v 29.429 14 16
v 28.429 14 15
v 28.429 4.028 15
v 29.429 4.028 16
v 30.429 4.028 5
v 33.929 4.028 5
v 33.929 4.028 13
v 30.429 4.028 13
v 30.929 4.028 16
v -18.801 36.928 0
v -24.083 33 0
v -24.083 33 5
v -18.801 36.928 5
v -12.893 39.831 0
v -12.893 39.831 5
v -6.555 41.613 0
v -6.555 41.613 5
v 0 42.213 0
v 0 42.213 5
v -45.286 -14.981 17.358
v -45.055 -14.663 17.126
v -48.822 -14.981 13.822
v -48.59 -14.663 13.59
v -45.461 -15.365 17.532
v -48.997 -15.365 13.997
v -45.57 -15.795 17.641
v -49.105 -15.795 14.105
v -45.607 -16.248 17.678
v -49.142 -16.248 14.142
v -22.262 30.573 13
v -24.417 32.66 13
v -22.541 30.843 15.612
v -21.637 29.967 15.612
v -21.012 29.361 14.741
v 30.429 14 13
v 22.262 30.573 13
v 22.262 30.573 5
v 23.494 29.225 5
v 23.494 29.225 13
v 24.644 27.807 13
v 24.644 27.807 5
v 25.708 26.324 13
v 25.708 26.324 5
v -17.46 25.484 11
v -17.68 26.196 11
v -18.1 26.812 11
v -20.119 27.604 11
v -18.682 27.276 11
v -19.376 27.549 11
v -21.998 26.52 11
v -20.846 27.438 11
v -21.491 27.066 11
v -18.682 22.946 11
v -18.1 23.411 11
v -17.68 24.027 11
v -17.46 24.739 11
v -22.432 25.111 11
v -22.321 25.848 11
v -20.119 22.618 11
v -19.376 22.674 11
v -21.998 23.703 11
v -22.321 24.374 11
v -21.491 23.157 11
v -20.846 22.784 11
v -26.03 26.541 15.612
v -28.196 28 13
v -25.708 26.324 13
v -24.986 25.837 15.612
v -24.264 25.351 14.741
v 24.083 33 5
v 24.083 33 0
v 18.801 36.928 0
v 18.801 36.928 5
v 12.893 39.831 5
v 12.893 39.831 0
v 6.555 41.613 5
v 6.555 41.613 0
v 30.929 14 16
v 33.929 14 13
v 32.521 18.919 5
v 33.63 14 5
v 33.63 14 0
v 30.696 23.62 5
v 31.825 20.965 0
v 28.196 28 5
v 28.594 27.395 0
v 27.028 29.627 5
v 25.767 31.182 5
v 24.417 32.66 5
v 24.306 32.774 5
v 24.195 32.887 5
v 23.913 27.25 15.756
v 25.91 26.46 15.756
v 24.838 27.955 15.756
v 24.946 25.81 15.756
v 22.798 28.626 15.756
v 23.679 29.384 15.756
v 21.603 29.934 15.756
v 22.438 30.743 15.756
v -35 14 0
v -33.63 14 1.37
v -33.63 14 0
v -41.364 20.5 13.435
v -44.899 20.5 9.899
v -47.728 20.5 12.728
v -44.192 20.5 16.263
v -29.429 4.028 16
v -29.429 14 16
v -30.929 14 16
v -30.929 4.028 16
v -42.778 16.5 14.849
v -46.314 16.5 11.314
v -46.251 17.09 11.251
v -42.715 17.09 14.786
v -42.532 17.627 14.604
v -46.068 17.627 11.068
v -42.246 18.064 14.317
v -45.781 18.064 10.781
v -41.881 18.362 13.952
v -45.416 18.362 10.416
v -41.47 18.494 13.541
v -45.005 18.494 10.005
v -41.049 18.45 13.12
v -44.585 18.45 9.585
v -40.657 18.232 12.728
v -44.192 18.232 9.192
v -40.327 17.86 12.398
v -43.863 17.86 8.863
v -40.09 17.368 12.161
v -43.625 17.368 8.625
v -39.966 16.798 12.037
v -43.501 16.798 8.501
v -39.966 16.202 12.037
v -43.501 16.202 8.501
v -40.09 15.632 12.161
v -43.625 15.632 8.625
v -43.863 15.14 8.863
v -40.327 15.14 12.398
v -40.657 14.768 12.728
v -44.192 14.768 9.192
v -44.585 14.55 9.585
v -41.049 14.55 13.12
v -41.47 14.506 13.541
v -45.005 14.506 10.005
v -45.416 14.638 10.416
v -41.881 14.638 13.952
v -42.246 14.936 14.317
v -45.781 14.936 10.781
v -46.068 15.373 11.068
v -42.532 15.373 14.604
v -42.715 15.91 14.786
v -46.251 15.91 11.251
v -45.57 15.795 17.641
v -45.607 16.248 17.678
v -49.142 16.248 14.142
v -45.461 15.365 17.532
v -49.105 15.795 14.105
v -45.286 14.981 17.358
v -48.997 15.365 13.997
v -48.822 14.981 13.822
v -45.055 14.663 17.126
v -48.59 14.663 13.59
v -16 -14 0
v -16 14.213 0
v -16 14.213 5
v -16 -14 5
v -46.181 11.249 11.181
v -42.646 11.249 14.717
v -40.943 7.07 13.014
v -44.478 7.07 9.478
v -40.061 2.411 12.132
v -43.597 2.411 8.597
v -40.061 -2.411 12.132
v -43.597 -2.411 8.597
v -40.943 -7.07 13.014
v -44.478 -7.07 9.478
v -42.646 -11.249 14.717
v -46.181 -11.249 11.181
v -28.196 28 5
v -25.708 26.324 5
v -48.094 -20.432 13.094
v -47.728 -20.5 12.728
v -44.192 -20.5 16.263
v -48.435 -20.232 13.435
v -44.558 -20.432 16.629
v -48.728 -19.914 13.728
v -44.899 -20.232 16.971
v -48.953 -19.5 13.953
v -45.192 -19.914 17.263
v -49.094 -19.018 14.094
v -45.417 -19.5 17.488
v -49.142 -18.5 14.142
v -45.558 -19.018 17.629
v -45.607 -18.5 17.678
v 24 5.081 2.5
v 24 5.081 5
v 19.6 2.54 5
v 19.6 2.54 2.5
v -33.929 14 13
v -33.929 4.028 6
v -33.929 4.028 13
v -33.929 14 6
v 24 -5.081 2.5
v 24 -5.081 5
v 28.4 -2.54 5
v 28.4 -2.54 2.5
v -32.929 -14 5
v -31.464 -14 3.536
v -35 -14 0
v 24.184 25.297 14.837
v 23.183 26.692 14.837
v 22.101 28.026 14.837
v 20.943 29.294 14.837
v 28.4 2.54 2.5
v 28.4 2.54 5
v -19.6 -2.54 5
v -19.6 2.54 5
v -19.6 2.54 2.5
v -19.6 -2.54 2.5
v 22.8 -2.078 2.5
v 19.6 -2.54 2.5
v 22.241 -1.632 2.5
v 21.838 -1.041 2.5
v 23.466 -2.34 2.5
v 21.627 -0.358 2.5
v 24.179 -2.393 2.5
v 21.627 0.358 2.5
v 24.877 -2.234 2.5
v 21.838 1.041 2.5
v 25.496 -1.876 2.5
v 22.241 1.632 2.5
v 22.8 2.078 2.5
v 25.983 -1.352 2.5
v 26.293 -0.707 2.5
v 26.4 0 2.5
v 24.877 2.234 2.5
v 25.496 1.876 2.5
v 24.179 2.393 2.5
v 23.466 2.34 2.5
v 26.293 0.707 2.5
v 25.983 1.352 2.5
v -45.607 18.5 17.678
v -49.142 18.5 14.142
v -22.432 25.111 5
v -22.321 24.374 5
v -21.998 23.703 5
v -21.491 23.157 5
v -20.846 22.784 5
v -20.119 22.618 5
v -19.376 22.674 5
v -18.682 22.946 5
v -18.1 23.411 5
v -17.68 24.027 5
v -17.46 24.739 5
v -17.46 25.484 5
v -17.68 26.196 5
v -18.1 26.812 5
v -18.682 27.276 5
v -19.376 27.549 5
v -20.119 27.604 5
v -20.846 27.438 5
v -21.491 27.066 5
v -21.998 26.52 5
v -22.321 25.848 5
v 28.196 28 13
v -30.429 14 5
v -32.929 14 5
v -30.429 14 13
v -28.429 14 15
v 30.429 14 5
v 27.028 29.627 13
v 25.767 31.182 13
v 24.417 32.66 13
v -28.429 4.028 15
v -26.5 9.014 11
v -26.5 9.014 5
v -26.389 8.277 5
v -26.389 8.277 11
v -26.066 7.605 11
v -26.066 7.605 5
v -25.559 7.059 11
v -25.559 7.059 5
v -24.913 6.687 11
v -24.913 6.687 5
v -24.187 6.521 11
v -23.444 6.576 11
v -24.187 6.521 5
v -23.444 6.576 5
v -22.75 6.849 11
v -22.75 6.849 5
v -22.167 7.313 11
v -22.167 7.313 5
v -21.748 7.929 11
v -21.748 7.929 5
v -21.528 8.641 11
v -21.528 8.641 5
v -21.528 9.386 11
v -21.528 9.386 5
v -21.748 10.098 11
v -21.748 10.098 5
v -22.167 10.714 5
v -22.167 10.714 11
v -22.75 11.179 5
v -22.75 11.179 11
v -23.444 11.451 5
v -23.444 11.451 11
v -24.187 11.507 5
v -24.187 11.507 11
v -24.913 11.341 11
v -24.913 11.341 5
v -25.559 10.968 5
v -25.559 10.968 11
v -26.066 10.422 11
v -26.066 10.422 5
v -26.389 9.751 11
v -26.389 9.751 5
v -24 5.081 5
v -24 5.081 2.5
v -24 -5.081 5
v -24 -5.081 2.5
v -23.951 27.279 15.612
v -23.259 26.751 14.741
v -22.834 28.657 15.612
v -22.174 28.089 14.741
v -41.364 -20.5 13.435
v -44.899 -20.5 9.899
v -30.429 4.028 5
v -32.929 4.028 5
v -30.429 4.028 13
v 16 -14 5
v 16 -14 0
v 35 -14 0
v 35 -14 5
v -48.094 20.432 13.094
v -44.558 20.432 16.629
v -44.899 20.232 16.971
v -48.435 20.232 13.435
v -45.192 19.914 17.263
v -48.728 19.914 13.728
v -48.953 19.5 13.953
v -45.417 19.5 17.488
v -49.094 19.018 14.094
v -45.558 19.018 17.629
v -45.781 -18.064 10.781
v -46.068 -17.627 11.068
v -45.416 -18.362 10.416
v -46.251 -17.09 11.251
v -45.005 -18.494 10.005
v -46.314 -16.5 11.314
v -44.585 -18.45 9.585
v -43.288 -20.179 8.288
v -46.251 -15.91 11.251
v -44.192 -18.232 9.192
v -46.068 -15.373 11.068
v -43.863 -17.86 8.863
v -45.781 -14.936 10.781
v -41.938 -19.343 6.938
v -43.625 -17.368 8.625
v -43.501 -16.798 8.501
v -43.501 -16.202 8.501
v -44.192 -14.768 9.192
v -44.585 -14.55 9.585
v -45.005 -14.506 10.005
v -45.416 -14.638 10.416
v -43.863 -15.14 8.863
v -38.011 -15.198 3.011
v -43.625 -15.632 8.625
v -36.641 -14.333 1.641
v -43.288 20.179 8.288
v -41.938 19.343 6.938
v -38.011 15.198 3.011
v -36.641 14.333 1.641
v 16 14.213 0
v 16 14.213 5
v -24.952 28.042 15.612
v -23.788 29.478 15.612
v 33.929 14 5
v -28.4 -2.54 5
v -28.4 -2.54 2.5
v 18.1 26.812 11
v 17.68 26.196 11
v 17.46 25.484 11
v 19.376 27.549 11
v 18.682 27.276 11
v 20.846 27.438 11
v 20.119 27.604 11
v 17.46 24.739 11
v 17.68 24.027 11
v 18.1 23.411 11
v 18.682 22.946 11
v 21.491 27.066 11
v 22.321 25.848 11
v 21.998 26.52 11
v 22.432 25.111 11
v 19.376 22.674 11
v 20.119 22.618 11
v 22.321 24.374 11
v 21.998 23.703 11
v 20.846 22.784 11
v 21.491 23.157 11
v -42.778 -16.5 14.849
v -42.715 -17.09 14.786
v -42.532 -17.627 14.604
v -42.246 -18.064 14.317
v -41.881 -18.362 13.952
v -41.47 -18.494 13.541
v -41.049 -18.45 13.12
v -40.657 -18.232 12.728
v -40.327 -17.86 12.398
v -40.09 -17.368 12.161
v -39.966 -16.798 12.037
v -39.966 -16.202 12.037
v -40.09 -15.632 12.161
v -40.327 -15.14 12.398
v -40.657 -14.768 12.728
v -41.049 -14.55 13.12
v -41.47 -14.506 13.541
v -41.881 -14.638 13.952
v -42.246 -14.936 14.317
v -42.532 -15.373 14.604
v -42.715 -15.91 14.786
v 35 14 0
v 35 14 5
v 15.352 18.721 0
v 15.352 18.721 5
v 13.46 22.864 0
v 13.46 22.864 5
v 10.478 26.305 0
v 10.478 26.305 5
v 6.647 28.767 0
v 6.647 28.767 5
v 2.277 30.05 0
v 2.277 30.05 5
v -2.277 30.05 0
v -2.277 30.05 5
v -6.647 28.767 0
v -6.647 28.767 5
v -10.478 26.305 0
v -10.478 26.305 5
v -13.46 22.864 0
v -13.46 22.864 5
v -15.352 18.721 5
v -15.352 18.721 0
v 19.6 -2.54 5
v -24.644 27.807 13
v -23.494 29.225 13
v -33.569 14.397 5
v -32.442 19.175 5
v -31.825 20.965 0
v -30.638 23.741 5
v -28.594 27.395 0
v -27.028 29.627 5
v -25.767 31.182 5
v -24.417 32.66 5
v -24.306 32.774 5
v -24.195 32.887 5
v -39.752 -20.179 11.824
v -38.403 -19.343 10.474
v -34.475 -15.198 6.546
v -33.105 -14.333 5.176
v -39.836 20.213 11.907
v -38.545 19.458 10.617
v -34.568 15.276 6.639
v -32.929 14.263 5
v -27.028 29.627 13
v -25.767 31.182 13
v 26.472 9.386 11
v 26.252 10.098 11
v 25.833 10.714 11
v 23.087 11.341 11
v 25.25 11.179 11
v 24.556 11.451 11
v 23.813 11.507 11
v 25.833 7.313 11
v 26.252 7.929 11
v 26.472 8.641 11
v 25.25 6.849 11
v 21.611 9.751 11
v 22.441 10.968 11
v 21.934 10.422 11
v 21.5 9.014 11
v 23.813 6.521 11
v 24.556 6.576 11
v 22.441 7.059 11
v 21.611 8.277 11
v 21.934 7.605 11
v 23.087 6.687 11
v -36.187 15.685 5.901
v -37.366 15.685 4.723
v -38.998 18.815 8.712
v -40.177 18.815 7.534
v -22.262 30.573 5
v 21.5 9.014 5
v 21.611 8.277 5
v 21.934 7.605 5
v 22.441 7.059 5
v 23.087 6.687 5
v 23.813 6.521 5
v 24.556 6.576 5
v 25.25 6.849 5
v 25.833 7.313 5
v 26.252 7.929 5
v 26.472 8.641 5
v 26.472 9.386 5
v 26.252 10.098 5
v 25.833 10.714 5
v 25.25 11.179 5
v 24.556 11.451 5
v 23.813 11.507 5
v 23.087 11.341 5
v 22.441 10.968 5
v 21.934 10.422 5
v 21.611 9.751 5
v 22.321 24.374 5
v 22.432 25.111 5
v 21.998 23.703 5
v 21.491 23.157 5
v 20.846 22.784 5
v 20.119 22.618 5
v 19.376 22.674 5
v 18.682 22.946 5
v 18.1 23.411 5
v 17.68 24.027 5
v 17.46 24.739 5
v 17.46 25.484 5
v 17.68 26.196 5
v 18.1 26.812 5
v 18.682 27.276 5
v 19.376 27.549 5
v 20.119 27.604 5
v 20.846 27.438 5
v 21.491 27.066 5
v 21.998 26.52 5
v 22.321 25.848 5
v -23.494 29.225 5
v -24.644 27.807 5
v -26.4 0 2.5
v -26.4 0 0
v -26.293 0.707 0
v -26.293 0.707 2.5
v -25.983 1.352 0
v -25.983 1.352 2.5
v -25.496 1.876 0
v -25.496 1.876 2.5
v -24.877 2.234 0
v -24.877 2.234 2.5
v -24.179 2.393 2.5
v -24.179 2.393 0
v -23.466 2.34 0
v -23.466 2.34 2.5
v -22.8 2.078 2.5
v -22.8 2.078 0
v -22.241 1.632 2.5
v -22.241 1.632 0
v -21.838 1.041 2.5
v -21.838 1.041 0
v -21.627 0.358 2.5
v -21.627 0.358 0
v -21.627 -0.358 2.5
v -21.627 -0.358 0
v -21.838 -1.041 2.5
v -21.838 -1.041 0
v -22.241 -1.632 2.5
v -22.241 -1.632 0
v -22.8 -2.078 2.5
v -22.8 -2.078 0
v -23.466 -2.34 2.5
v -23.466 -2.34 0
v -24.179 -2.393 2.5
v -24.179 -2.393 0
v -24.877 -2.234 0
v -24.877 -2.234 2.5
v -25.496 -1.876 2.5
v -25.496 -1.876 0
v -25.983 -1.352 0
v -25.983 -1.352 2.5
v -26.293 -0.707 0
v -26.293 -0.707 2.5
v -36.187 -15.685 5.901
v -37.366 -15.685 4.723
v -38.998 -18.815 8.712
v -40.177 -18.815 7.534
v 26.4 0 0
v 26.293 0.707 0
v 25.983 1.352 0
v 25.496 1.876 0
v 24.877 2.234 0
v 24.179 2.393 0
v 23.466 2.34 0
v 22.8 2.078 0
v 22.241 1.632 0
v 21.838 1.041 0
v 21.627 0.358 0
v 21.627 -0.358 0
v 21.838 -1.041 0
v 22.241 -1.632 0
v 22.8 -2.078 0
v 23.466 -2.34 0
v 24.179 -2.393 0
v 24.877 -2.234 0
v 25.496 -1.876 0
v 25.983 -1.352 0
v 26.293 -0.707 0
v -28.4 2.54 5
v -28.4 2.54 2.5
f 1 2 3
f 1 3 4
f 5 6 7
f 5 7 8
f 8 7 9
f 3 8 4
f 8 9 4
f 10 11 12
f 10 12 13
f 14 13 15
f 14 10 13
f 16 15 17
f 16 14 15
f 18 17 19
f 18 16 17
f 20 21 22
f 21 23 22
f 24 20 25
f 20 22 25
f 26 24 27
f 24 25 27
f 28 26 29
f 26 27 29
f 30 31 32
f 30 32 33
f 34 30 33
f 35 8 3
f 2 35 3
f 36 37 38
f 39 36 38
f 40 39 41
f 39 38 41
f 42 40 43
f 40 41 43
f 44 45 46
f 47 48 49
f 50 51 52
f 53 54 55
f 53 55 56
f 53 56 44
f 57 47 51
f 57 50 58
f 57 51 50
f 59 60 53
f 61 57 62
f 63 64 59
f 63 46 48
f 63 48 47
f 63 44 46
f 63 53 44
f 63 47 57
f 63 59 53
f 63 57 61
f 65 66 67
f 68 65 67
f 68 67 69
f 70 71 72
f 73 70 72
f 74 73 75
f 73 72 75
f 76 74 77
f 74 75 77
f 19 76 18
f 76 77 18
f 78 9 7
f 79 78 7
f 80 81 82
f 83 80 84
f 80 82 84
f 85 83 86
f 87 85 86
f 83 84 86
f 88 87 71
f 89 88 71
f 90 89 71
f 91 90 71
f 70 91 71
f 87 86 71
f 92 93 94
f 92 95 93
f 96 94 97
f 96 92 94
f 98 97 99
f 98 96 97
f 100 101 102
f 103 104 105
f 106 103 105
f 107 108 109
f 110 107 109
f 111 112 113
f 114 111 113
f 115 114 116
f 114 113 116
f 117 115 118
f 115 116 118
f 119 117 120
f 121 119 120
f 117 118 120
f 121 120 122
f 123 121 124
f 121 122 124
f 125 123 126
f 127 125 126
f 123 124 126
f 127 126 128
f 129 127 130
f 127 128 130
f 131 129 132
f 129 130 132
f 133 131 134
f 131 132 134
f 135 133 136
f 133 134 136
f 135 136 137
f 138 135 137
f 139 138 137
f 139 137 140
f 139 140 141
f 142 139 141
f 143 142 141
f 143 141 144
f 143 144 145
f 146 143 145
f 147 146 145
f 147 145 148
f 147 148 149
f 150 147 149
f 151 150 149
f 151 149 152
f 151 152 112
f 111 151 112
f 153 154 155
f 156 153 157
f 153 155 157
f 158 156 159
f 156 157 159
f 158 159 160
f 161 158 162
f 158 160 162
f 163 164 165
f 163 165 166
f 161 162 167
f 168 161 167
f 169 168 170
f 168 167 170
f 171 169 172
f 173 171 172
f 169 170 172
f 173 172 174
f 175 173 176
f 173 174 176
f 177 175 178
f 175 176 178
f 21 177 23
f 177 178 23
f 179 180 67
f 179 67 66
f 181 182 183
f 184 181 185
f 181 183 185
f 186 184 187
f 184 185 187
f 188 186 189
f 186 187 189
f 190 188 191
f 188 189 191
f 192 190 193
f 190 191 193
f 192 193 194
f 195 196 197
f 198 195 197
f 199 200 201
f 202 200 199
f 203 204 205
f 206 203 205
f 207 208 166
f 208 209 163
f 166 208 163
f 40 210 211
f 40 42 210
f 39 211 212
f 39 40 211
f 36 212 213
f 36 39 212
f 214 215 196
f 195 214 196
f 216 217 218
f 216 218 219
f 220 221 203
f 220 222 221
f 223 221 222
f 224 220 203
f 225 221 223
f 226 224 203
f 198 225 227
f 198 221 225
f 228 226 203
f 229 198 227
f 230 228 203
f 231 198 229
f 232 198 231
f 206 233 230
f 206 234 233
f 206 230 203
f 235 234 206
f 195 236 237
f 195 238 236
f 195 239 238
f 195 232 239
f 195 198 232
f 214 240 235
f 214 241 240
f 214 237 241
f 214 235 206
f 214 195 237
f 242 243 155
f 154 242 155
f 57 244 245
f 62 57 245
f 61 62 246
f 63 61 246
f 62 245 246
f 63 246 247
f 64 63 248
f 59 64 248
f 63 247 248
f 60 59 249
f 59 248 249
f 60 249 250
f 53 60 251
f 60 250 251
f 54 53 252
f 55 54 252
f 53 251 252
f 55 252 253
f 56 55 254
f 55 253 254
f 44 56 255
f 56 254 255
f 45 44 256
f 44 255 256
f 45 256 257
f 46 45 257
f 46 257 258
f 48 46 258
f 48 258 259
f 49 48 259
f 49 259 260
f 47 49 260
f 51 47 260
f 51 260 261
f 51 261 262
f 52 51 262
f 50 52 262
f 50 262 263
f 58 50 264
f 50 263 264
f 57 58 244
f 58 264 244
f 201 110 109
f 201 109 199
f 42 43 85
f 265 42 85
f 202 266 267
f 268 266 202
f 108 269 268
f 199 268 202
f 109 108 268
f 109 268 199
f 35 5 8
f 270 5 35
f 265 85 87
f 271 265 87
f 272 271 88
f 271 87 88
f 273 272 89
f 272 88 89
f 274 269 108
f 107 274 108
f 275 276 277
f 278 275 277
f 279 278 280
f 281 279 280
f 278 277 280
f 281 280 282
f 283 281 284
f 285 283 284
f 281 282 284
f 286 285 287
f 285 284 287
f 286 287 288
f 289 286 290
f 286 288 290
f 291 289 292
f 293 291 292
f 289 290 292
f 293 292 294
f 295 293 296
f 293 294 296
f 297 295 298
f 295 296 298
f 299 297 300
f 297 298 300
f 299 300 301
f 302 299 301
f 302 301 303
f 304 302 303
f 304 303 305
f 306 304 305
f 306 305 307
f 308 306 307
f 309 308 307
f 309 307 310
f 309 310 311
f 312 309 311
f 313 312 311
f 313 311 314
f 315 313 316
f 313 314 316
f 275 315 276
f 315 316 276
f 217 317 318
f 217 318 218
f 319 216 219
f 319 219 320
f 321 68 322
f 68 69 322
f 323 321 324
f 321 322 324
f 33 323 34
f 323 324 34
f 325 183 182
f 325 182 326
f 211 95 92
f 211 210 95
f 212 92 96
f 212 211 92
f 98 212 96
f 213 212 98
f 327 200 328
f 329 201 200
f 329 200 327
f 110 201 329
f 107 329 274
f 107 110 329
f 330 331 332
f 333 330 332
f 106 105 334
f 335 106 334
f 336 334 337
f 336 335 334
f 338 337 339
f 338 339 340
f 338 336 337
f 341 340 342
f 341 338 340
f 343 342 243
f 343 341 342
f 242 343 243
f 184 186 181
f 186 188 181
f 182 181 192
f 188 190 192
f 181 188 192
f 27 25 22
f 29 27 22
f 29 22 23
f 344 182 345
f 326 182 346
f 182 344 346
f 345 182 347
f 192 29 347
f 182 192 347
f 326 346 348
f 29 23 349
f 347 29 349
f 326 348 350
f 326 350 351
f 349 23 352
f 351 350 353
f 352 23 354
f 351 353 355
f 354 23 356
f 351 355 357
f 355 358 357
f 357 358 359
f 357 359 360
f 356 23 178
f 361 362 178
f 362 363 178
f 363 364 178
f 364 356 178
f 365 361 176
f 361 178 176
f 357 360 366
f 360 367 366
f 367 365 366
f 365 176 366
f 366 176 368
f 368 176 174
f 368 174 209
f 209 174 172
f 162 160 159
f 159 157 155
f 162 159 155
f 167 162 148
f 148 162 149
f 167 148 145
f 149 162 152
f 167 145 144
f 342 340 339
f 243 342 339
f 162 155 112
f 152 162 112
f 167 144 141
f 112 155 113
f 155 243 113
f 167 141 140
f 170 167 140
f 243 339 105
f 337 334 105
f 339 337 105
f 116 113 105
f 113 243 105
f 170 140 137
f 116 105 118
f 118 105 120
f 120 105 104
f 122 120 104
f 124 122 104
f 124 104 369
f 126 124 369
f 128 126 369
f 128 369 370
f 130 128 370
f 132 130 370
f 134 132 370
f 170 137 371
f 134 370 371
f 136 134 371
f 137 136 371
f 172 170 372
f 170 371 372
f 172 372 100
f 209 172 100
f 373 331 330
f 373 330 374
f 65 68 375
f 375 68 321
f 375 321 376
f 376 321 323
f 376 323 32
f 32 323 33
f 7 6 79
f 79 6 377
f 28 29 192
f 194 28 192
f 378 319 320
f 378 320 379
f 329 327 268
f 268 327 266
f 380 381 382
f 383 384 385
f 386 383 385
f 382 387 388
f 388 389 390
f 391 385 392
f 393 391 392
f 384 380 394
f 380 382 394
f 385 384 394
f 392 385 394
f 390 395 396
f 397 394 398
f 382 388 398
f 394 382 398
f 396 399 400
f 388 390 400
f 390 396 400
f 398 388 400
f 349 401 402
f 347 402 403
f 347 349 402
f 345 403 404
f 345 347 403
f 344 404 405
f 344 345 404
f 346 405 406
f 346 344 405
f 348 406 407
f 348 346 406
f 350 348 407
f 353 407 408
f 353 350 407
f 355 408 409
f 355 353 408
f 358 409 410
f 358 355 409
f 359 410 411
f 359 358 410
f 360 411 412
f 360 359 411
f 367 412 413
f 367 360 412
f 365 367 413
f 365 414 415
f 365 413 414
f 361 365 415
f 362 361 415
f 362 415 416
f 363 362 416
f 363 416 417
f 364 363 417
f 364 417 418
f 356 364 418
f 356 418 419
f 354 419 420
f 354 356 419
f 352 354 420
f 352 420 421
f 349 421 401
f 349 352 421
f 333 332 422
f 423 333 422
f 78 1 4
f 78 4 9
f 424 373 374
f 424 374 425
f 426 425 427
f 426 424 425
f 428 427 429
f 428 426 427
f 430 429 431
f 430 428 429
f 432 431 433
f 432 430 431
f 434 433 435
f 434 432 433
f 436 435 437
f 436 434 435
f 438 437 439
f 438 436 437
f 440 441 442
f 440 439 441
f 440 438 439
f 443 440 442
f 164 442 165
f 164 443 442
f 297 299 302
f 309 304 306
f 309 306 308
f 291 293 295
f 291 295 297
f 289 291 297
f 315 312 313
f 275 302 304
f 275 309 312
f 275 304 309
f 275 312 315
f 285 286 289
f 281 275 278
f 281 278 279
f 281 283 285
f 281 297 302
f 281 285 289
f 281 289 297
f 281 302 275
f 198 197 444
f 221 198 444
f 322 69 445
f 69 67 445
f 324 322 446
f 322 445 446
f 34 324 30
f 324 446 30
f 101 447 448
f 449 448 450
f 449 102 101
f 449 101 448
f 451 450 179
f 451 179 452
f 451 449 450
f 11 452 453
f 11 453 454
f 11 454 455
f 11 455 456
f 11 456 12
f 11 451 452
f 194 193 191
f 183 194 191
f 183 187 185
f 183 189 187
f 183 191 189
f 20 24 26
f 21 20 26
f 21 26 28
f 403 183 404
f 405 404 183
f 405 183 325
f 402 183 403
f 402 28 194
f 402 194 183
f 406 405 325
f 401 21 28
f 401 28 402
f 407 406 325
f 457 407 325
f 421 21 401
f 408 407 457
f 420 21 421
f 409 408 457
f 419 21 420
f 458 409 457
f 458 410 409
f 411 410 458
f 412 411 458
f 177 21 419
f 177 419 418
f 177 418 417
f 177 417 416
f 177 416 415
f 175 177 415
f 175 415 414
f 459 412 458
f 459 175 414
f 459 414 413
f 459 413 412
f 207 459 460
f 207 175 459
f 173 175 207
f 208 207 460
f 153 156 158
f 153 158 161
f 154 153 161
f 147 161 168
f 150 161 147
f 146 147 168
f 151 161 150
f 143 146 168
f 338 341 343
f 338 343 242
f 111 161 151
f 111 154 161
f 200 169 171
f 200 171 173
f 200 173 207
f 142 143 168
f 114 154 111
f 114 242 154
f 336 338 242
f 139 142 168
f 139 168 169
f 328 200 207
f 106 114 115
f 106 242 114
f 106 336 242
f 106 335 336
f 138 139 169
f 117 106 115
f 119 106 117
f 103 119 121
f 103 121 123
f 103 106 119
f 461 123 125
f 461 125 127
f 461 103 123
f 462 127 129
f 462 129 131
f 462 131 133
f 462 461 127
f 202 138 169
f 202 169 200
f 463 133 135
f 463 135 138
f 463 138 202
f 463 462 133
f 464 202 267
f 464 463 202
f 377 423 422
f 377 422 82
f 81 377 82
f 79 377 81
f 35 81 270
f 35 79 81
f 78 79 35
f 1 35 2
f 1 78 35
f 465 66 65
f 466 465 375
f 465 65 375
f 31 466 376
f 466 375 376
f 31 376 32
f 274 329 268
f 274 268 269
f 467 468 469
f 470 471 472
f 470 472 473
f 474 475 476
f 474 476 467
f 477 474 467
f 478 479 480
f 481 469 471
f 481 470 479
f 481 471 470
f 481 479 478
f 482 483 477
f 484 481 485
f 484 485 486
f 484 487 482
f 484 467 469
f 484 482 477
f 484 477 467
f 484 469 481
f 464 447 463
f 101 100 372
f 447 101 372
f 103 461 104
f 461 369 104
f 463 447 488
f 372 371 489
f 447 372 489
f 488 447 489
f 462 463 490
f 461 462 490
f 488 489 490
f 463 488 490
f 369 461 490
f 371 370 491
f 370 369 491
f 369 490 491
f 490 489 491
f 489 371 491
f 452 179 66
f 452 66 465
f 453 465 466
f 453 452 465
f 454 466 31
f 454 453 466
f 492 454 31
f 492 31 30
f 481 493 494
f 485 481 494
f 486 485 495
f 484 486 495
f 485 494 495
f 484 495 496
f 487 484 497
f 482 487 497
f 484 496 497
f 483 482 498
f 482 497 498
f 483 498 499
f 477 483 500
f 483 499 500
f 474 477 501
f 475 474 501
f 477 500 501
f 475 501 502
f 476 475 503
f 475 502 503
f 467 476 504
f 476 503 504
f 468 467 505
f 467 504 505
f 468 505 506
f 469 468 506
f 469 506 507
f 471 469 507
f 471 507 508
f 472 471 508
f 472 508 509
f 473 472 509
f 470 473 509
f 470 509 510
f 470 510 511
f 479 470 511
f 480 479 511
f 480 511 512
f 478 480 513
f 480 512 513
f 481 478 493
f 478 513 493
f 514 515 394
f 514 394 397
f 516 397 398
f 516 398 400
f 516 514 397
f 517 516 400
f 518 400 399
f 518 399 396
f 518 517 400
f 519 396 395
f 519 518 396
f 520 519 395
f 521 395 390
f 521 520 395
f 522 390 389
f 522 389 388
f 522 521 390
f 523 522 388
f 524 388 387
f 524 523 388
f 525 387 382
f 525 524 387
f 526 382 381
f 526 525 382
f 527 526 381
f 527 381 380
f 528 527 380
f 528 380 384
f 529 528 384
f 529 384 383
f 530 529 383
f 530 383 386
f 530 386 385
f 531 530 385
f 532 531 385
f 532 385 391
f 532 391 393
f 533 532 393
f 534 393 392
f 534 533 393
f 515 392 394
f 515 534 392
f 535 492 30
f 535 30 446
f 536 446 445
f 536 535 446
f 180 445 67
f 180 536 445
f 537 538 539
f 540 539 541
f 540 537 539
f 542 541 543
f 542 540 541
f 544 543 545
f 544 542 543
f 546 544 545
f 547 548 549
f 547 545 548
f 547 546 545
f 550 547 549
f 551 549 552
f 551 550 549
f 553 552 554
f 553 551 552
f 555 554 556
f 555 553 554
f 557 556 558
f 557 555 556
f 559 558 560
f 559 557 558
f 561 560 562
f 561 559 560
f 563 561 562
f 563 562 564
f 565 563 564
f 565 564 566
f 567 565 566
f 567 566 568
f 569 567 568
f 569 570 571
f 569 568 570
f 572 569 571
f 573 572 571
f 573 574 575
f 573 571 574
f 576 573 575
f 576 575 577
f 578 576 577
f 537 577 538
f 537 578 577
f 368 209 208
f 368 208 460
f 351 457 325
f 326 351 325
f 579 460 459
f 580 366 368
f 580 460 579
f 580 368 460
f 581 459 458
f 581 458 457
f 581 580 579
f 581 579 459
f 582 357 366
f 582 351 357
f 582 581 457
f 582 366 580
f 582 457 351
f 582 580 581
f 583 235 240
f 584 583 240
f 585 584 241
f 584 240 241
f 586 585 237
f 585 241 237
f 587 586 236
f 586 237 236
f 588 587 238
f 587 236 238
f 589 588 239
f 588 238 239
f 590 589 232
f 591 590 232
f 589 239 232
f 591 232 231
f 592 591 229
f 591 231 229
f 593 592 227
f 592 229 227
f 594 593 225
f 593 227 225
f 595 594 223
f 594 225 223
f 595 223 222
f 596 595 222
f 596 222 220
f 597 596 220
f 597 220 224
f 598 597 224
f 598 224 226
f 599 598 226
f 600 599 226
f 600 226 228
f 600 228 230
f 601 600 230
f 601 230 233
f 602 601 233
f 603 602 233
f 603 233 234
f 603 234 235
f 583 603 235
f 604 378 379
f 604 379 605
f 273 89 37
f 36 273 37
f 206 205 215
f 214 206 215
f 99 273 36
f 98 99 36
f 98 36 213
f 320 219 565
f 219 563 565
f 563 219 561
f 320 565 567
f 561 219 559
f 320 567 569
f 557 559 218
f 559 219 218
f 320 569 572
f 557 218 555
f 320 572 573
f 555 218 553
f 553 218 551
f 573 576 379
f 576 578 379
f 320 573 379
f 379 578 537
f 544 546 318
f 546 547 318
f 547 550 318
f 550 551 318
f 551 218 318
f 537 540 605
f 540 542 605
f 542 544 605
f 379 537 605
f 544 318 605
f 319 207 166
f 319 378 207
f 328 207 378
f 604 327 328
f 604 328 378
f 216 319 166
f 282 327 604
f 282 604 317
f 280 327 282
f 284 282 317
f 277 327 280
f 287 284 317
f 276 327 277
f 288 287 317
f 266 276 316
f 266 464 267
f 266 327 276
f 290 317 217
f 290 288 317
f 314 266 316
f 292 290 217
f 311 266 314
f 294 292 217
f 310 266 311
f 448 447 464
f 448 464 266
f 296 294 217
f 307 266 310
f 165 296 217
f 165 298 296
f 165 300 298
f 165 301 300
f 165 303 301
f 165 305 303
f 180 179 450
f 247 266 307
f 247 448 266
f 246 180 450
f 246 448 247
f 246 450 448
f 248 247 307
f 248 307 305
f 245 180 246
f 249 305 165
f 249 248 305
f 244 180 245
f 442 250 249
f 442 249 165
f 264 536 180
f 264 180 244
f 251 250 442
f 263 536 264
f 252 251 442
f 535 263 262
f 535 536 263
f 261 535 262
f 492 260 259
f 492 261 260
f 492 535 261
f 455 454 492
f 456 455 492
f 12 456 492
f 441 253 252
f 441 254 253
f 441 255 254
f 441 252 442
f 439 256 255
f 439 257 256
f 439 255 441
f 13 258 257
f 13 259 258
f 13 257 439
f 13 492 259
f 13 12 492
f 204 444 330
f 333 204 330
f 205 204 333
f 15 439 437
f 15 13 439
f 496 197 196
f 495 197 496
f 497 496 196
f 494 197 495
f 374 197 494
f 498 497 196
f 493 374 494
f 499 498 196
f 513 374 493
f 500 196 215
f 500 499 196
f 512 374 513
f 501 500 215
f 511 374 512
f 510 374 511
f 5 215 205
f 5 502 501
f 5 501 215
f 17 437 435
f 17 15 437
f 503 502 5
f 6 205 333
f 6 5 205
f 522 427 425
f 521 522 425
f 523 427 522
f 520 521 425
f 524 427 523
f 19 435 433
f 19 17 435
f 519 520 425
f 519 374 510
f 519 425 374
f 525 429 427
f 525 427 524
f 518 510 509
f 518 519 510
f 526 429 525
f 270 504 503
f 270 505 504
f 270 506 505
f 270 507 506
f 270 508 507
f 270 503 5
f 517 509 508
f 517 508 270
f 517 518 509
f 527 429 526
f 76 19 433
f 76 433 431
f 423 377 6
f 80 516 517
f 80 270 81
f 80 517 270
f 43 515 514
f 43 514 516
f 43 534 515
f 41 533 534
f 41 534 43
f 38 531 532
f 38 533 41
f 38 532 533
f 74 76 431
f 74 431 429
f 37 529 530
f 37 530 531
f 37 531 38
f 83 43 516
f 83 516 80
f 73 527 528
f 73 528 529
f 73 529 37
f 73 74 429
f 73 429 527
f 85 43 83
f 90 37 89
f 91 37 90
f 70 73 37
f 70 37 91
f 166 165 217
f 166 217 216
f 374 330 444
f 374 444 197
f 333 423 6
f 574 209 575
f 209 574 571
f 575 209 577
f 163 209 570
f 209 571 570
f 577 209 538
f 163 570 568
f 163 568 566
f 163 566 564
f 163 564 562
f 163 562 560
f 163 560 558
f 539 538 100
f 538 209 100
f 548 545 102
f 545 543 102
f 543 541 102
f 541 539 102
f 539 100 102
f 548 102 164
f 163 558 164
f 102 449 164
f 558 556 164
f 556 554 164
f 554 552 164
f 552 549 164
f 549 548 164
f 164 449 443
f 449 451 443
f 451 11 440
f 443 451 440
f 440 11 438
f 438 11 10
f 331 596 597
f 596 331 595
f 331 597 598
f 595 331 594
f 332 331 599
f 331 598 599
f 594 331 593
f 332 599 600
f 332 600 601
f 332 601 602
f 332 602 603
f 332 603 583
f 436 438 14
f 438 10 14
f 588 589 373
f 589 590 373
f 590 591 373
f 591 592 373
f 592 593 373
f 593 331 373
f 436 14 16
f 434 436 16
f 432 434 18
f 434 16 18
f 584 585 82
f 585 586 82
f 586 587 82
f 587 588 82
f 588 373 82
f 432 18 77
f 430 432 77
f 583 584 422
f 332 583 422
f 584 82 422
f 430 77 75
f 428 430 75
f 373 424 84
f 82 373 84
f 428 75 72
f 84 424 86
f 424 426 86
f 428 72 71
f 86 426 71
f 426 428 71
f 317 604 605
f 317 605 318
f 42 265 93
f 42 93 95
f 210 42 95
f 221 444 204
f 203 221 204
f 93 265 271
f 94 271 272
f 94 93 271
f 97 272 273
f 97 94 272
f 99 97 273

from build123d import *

# Parameters (mm, degrees)
SKETCH2_W                = 70
SKETCH2_H                = 28
BOSS_EXTRUDE1_DEPTH      = 5
CUT_NUT_DEPTH            = 2.5
SKETCH4_R                = 2.4
CUT_SCREW_DEPTH          = 38.7789624
SKETCH8_R                = 11
CUT_HOT_END_DEPTH        = 39.026306684
SKETCH11_W               = 22
SKETCH11_H               = 14
CUT_EXTRUDE8_DEPTH       = 39.026306684
BOSS_FAN_DEPTH           = 5
SKETCH9_R                = 2
CUT_FAN_SCREW_DEPTH      = 67.437703487
SKETCH10_R               = 18.5
CUT_EXTRUDE7_DEPTH       = 67.437703487
FILLET2_R                = 2
SKETCH12_W               = 3.5
SKETCH12_H               = 9.97245834
BOSS_BACK_HOOK_DEPTH     = 8
BOSS_BACK_HOOK_TOP_DEPTH = 9.97245834
SKETCH17_R               = 2.5
BOSS_EXTRUDE10_DEPTH     = 6
BOSS_FRONT_SUPPORT_REACH = 58.104
BOSS_FRONT_HOOK_DEPTH    = 8
SKETCH25_R               = 2.5
BOSS_FRONT_PIN_DEPTH     = 6
BOSS_FRONT_CURVE_DEPTH   = 5
CUT_EXTRUDE9_DEPTH       = 68.152189514


with BuildPart() as part:
    # Sketch2 → Boss-Extrude1 (new body)
    with BuildSketch(Plane.XY):
        Rectangle(SKETCH2_W, SKETCH2_H)
    extrude(amount=BOSS_EXTRUDE1_DEPTH)

    # Sketch3 → Cut-Nut (cut)
    with BuildSketch(Plane.XY.offset(5)):
        Polygon((28.4, 2.540341184), (24, 5.080682369), (19.6, 2.540341184), (19.6, -2.540341184), (24, -5.080682369), (28.4, -2.540341184), align=None)
    cut_nut = extrude(amount=-CUT_NUT_DEPTH, mode=Mode.SUBTRACT)

    # Sketch4 → Cut-Screw (cut, through all)
    with BuildSketch(Plane.XY.offset(2.5)):
        with Locations((24, 0)):
            Circle(SKETCH4_R)
    cut_screw = extrude(amount=-CUT_SCREW_DEPTH, mode=Mode.SUBTRACT)

    # Mirror1: Cut-Nut, Cut-Screw across plane
    add(cut_nut.mirror(Plane(origin=(0, 0, 0), x_dir=(0, 0, 1), z_dir=(1, 0, 0))), mode=Mode.SUBTRACT)
    add(cut_screw.mirror(Plane(origin=(0, 0, 0), x_dir=(0, 0, 1), z_dir=(1, 0, 0))), mode=Mode.SUBTRACT)

    # Sketch8 → Cut-Hot End (cut, through all)
    with BuildSketch(Plane.XY.offset(5)):
        Circle(SKETCH8_R)
    extrude(amount=-CUT_HOT_END_DEPTH, mode=Mode.SUBTRACT)

    # Sketch11 → Cut-Extrude8 (cut, through all)
    with BuildSketch(Plane.XY.offset(5)):
        with Locations((0, -7)):
            Rectangle(SKETCH11_W, SKETCH11_H)
    extrude(amount=-CUT_EXTRUDE8_DEPTH, mode=Mode.SUBTRACT)

    # Sketch6 → Boss-Fan (add)
    with BuildSketch(Plane(origin=(-17.5, 0, -17.5), x_dir=(-0.7071067811865488, 0, 0.7071067811865464), z_dir=(-0.7071067811865464, 0, -0.7071067811865488))):
        with BuildLine():
            Line((38.748737342, 20.5), (44.748737342, 20.5))
            Line((44.748737342, 20.5), (44.748737342, -20.5))
            Line((44.748737342, -20.5), (38.748737342, -20.5))
            add(Edge.make_bspline(
                [(24.748737342, -14), (30.971356168, -14), (32.526118515, -20.5), (38.748737342, -20.5)],
                knots=[0, 0, 0, 0, 1, 1, 1, 1], degree=3))
            Line((24.748737342, -14), (24.748737342, 14))
            add(Edge.make_bspline(
                [(24.748737342, 14), (30.971356168, 14), (32.526118515, 20.5), (38.748737342, 20.5)],
                knots=[0, 0, 0, 0, 1, 1, 1, 1], degree=3))
        make_face()
    extrude(amount=-BOSS_FAN_DEPTH)

    # Sketch9 → Cut-Fan Screw (cut, through all)
    with BuildSketch(Plane(origin=(-17.5, 0, -17.5), x_dir=(-0.7071067811865487, 1.3344026738283447e-14, 0.7071067811865464), z_dir=(-0.7071067811865464, 1.3877787807814728e-14, -0.7071067811865487))):
        with Locations((38.748737342, 16.5)):
            Circle(SKETCH9_R)
    cut_fan_screw = extrude(amount=-CUT_FAN_SCREW_DEPTH, mode=Mode.SUBTRACT)

    # Mirror-Fan Screw: Cut-Fan Screw across plane
    add(cut_fan_screw.mirror(Plane.ZX), mode=Mode.SUBTRACT)

    # Sketch10 → Cut-Extrude7 (cut, through all)
    with BuildSketch(Plane(origin=(-17.5, 0, -17.5), x_dir=(-0.7071067811865488, 1.4278108609963275e-14, 0.7071067811865464), z_dir=(-0.7071067811865464, 1.3877787807814742e-14, -0.7071067811865488))):
        with Locations((55.248737342, 0)):
            Circle(SKETCH10_R)
    extrude(amount=-CUT_EXTRUDE7_DEPTH, mode=Mode.SUBTRACT)

    # Fillet2
    fillet2_edges = [part.edges().sort_by_distance(p)[0] for p in [
        (-47.374368671, -15.231546212, 15.909902577),
        (-47.374368671, 15.231546212, 15.909902577),
        (-47.374368671, 20.5, 15.909902577),
        (-47.374368671, -20.5, 15.909902577),
    ]]
    fillet(fillet2_edges, radius=FILLET2_R)

    # Sketch12 → Boss-Back Hook (add)
    with BuildSketch(Plane.XY.offset(5)):
        with Locations((-32.178932188, 9.01377083)):
            Rectangle(SKETCH12_W, SKETCH12_H)
    boss_back_hook = extrude(amount=BOSS_BACK_HOOK_DEPTH)

    # Sketch14 → Boss-Back Hook Top (add)
    with BuildSketch(Plane.XZ.offset(-4.02754166)):
        Polygon((-30.428932188, 13), (-28.428932188, 15), (-29.428932188, 16), (-30.928932188, 16), (-33.928932188, 13), align=None)
    boss_back_hook_top = extrude(amount=-BOSS_BACK_HOOK_TOP_DEPTH)

    # Mirror-Back Hook: Boss-Back Hook, Boss-Back Hook Top across plane
    add(boss_back_hook.mirror(Plane(origin=(0, 0, 0), x_dir=(0, 0, 1), z_dir=(1, 0, 0))))
    add(boss_back_hook_top.mirror(Plane(origin=(0, 0, 0), x_dir=(0, 0, 1), z_dir=(1, 0, 0))))

    # Sketch17 → Boss-Extrude10 (add)
    with BuildSketch(Plane.XY.offset(5)):
        with Locations(Location((-24, 9.01377083, 0), (0, 0, 180))):
            Circle(SKETCH17_R)
        with Locations(Location((24, 9.01377083, 0), (0, 0, 180))):
            Circle(SKETCH17_R)
    extrude(amount=BOSS_EXTRUDE10_DEPTH)

    # Boss-Front Support: up to this face of the body (flat: up to its plane)
    boss_front_support_end = Plane(part.part.faces().sort_by_distance((23, -13.265266046, 5))[0])
    # Sketch20 → Boss-Front Support (add, up to the picked face)
    with BuildSketch(Plane(origin=(0, 0, 0), x_dir=(-1, 0, 0), z_dir=(0, 0, -1)), mode=Mode.PRIVATE) as boss_front_support_sk1:
        with BuildLine():
            Line((24.083189158, 33), (15.583240043, 24.529411765))
            ThreePointArc((15.583240043, 24.529411765), (19.23814858, 19.67209629), (21.424285286, 14))
            Line((21.424285286, 14), (33.630343442, 14))
            ThreePointArc((33.630343442, 14), (30.380305483, 24.265550718), (24.083189158, 33))
        make_face()
    boss_front_support_tool1 = split(extrude(boss_front_support_sk1.sketch, amount=-BOSS_FRONT_SUPPORT_REACH, mode=Mode.PRIVATE), bisect_by=boss_front_support_end, keep=Keep.BOTH, mode=Mode.PRIVATE)
    boss_front_support = boss_front_support_tool1.solids().sort_by(Axis((-24.942204, 21.980876, 0), (0, 0, 1)))[0]
    add(boss_front_support)

    # Sketch21 → Boss-Front Hook (add)
    with BuildSketch(Plane.XY.offset(5)):
        with BuildLine():
            Line((-24.416846712, 32.660464844), (-22.262419061, 30.57277677))
            ThreePointArc((-22.262419061, 30.57277677), (-24.079068363, 28.524304515), (-25.707884563, 26.323529412))
            Line((-25.707884563, 26.323529412), (-28.19574436, 28))
            ThreePointArc((-28.19574436, 28), (-26.409300785, 30.413753339), (-24.416846712, 32.660464844))
        make_face()
    boss_front_hook = extrude(amount=BOSS_FRONT_HOOK_DEPTH)

    # Sweep-Front Hook Top: sweep along a curve in space
    with BuildLine() as sweep_front_hook_top_path:
        ThreePointArc((-25.707884563, 26.323529412, 13), (-24.079068363, 28.524304515, 13), (-22.262419061, 30.57277677, 13))
    # Sketch22 → Sweep-Front Hook Top (sweep)
    with BuildSketch(Plane(origin=(4.752413936, 4.394805718, 0), x_dir=(0, 0, -1), z_dir=(0.6958960248359726, 0.7181425503460238, 0))):
        Polygon((-13, 37.617647059), (-13, 40.617647059), (-15.611662163, 38.005984896), (-15.611662163, 36.747093005), (-14.741108108, 35.87653895), align=None)
    sweep(path=sweep_front_hook_top_path.line)

    # Sketch25 → Boss-Front Pin (add)
    with BuildSketch(Plane.XY.offset(5)):
        with Locations(Location((-19.93223769, 25.111248957, 0), (0, 0, 180))):
            Circle(SKETCH25_R)
    boss_front_pin = extrude(amount=BOSS_FRONT_PIN_DEPTH)

    # Sketch23 → Boss-Front Curve (add)
    with BuildSketch(Plane(origin=(0, 0, 0), x_dir=(-1, 0, 0), z_dir=(0, 0, -1))):
        with BuildLine():
            Line((0, 42.213351454), (0, 14))
            Line((0, 14), (33.630343442, 14))
            Line((33.630343442, 14), (24.083189158, 33))
            ThreePointArc((24.083189158, 33), (12.892690226, 39.831392494), (0, 42.213351454))
        make_face()
    boss_front_curve = extrude(amount=-BOSS_FRONT_CURVE_DEPTH)

    # Mirror5: Boss-Front Support, Boss-Front Hook, Boss-Front Pin, Boss-Front Curve across plane
    add(boss_front_support.mirror(Plane(origin=(0, 0, 0), x_dir=(0, 0, 1), z_dir=(1, 0, 0))))
    add(boss_front_hook.mirror(Plane(origin=(0, 0, 0), x_dir=(0, 0, 1), z_dir=(1, 0, 0))))
    add(boss_front_pin.mirror(Plane(origin=(0, 0, 0), x_dir=(0, 0, 1), z_dir=(1, 0, 0))))
    add(boss_front_curve.mirror(Plane(origin=(0, 0, 0), x_dir=(0, 0, 1), z_dir=(1, 0, 0))))

    # Sweep2: sweep along a curve in space
    with BuildLine() as sweep2_path:
        ThreePointArc((25.707884563, 26.323529412, 13), (24.079068363, 28.524304515, 13), (22.262419061, 30.57277677, 13))
    # Sketch24 → Sweep2 (sweep)
    with BuildSketch(Plane(origin=(-4.170823776, 6.189446367, 0), x_dir=(0.8292865988159824, 0.5588235294117634, 0), z_dir=(0.5588235294117634, -0.8292865988159824, 0))):
        Polygon((36.029411765, 13), (39.029411765, 13), (36.273559232, 15.755852533), (35.110794254, 15.755852533), (34.192176743, 14.837235022), align=None)
    sweep(path=sweep2_path.line)

    # Sketch26 → Cut-Extrude9 (cut, through all)
    with BuildSketch(Plane(origin=(0, 0, 0), x_dir=(-1, 0, 0), z_dir=(0, 0, -1))):
        with BuildLine():
            Line((-16, -14), (-16, 14.213351454))
            ThreePointArc((-16, 14.213351454), (0, 30.213351454), (16, 14.213351454))
            Line((16, 14.213351454), (16, -14))
            Line((16, -14), (-16, -14))
        make_face()
    extrude(amount=-CUT_EXTRUDE9_DEPTH, mode=Mode.SUBTRACT)


solid = part.part
